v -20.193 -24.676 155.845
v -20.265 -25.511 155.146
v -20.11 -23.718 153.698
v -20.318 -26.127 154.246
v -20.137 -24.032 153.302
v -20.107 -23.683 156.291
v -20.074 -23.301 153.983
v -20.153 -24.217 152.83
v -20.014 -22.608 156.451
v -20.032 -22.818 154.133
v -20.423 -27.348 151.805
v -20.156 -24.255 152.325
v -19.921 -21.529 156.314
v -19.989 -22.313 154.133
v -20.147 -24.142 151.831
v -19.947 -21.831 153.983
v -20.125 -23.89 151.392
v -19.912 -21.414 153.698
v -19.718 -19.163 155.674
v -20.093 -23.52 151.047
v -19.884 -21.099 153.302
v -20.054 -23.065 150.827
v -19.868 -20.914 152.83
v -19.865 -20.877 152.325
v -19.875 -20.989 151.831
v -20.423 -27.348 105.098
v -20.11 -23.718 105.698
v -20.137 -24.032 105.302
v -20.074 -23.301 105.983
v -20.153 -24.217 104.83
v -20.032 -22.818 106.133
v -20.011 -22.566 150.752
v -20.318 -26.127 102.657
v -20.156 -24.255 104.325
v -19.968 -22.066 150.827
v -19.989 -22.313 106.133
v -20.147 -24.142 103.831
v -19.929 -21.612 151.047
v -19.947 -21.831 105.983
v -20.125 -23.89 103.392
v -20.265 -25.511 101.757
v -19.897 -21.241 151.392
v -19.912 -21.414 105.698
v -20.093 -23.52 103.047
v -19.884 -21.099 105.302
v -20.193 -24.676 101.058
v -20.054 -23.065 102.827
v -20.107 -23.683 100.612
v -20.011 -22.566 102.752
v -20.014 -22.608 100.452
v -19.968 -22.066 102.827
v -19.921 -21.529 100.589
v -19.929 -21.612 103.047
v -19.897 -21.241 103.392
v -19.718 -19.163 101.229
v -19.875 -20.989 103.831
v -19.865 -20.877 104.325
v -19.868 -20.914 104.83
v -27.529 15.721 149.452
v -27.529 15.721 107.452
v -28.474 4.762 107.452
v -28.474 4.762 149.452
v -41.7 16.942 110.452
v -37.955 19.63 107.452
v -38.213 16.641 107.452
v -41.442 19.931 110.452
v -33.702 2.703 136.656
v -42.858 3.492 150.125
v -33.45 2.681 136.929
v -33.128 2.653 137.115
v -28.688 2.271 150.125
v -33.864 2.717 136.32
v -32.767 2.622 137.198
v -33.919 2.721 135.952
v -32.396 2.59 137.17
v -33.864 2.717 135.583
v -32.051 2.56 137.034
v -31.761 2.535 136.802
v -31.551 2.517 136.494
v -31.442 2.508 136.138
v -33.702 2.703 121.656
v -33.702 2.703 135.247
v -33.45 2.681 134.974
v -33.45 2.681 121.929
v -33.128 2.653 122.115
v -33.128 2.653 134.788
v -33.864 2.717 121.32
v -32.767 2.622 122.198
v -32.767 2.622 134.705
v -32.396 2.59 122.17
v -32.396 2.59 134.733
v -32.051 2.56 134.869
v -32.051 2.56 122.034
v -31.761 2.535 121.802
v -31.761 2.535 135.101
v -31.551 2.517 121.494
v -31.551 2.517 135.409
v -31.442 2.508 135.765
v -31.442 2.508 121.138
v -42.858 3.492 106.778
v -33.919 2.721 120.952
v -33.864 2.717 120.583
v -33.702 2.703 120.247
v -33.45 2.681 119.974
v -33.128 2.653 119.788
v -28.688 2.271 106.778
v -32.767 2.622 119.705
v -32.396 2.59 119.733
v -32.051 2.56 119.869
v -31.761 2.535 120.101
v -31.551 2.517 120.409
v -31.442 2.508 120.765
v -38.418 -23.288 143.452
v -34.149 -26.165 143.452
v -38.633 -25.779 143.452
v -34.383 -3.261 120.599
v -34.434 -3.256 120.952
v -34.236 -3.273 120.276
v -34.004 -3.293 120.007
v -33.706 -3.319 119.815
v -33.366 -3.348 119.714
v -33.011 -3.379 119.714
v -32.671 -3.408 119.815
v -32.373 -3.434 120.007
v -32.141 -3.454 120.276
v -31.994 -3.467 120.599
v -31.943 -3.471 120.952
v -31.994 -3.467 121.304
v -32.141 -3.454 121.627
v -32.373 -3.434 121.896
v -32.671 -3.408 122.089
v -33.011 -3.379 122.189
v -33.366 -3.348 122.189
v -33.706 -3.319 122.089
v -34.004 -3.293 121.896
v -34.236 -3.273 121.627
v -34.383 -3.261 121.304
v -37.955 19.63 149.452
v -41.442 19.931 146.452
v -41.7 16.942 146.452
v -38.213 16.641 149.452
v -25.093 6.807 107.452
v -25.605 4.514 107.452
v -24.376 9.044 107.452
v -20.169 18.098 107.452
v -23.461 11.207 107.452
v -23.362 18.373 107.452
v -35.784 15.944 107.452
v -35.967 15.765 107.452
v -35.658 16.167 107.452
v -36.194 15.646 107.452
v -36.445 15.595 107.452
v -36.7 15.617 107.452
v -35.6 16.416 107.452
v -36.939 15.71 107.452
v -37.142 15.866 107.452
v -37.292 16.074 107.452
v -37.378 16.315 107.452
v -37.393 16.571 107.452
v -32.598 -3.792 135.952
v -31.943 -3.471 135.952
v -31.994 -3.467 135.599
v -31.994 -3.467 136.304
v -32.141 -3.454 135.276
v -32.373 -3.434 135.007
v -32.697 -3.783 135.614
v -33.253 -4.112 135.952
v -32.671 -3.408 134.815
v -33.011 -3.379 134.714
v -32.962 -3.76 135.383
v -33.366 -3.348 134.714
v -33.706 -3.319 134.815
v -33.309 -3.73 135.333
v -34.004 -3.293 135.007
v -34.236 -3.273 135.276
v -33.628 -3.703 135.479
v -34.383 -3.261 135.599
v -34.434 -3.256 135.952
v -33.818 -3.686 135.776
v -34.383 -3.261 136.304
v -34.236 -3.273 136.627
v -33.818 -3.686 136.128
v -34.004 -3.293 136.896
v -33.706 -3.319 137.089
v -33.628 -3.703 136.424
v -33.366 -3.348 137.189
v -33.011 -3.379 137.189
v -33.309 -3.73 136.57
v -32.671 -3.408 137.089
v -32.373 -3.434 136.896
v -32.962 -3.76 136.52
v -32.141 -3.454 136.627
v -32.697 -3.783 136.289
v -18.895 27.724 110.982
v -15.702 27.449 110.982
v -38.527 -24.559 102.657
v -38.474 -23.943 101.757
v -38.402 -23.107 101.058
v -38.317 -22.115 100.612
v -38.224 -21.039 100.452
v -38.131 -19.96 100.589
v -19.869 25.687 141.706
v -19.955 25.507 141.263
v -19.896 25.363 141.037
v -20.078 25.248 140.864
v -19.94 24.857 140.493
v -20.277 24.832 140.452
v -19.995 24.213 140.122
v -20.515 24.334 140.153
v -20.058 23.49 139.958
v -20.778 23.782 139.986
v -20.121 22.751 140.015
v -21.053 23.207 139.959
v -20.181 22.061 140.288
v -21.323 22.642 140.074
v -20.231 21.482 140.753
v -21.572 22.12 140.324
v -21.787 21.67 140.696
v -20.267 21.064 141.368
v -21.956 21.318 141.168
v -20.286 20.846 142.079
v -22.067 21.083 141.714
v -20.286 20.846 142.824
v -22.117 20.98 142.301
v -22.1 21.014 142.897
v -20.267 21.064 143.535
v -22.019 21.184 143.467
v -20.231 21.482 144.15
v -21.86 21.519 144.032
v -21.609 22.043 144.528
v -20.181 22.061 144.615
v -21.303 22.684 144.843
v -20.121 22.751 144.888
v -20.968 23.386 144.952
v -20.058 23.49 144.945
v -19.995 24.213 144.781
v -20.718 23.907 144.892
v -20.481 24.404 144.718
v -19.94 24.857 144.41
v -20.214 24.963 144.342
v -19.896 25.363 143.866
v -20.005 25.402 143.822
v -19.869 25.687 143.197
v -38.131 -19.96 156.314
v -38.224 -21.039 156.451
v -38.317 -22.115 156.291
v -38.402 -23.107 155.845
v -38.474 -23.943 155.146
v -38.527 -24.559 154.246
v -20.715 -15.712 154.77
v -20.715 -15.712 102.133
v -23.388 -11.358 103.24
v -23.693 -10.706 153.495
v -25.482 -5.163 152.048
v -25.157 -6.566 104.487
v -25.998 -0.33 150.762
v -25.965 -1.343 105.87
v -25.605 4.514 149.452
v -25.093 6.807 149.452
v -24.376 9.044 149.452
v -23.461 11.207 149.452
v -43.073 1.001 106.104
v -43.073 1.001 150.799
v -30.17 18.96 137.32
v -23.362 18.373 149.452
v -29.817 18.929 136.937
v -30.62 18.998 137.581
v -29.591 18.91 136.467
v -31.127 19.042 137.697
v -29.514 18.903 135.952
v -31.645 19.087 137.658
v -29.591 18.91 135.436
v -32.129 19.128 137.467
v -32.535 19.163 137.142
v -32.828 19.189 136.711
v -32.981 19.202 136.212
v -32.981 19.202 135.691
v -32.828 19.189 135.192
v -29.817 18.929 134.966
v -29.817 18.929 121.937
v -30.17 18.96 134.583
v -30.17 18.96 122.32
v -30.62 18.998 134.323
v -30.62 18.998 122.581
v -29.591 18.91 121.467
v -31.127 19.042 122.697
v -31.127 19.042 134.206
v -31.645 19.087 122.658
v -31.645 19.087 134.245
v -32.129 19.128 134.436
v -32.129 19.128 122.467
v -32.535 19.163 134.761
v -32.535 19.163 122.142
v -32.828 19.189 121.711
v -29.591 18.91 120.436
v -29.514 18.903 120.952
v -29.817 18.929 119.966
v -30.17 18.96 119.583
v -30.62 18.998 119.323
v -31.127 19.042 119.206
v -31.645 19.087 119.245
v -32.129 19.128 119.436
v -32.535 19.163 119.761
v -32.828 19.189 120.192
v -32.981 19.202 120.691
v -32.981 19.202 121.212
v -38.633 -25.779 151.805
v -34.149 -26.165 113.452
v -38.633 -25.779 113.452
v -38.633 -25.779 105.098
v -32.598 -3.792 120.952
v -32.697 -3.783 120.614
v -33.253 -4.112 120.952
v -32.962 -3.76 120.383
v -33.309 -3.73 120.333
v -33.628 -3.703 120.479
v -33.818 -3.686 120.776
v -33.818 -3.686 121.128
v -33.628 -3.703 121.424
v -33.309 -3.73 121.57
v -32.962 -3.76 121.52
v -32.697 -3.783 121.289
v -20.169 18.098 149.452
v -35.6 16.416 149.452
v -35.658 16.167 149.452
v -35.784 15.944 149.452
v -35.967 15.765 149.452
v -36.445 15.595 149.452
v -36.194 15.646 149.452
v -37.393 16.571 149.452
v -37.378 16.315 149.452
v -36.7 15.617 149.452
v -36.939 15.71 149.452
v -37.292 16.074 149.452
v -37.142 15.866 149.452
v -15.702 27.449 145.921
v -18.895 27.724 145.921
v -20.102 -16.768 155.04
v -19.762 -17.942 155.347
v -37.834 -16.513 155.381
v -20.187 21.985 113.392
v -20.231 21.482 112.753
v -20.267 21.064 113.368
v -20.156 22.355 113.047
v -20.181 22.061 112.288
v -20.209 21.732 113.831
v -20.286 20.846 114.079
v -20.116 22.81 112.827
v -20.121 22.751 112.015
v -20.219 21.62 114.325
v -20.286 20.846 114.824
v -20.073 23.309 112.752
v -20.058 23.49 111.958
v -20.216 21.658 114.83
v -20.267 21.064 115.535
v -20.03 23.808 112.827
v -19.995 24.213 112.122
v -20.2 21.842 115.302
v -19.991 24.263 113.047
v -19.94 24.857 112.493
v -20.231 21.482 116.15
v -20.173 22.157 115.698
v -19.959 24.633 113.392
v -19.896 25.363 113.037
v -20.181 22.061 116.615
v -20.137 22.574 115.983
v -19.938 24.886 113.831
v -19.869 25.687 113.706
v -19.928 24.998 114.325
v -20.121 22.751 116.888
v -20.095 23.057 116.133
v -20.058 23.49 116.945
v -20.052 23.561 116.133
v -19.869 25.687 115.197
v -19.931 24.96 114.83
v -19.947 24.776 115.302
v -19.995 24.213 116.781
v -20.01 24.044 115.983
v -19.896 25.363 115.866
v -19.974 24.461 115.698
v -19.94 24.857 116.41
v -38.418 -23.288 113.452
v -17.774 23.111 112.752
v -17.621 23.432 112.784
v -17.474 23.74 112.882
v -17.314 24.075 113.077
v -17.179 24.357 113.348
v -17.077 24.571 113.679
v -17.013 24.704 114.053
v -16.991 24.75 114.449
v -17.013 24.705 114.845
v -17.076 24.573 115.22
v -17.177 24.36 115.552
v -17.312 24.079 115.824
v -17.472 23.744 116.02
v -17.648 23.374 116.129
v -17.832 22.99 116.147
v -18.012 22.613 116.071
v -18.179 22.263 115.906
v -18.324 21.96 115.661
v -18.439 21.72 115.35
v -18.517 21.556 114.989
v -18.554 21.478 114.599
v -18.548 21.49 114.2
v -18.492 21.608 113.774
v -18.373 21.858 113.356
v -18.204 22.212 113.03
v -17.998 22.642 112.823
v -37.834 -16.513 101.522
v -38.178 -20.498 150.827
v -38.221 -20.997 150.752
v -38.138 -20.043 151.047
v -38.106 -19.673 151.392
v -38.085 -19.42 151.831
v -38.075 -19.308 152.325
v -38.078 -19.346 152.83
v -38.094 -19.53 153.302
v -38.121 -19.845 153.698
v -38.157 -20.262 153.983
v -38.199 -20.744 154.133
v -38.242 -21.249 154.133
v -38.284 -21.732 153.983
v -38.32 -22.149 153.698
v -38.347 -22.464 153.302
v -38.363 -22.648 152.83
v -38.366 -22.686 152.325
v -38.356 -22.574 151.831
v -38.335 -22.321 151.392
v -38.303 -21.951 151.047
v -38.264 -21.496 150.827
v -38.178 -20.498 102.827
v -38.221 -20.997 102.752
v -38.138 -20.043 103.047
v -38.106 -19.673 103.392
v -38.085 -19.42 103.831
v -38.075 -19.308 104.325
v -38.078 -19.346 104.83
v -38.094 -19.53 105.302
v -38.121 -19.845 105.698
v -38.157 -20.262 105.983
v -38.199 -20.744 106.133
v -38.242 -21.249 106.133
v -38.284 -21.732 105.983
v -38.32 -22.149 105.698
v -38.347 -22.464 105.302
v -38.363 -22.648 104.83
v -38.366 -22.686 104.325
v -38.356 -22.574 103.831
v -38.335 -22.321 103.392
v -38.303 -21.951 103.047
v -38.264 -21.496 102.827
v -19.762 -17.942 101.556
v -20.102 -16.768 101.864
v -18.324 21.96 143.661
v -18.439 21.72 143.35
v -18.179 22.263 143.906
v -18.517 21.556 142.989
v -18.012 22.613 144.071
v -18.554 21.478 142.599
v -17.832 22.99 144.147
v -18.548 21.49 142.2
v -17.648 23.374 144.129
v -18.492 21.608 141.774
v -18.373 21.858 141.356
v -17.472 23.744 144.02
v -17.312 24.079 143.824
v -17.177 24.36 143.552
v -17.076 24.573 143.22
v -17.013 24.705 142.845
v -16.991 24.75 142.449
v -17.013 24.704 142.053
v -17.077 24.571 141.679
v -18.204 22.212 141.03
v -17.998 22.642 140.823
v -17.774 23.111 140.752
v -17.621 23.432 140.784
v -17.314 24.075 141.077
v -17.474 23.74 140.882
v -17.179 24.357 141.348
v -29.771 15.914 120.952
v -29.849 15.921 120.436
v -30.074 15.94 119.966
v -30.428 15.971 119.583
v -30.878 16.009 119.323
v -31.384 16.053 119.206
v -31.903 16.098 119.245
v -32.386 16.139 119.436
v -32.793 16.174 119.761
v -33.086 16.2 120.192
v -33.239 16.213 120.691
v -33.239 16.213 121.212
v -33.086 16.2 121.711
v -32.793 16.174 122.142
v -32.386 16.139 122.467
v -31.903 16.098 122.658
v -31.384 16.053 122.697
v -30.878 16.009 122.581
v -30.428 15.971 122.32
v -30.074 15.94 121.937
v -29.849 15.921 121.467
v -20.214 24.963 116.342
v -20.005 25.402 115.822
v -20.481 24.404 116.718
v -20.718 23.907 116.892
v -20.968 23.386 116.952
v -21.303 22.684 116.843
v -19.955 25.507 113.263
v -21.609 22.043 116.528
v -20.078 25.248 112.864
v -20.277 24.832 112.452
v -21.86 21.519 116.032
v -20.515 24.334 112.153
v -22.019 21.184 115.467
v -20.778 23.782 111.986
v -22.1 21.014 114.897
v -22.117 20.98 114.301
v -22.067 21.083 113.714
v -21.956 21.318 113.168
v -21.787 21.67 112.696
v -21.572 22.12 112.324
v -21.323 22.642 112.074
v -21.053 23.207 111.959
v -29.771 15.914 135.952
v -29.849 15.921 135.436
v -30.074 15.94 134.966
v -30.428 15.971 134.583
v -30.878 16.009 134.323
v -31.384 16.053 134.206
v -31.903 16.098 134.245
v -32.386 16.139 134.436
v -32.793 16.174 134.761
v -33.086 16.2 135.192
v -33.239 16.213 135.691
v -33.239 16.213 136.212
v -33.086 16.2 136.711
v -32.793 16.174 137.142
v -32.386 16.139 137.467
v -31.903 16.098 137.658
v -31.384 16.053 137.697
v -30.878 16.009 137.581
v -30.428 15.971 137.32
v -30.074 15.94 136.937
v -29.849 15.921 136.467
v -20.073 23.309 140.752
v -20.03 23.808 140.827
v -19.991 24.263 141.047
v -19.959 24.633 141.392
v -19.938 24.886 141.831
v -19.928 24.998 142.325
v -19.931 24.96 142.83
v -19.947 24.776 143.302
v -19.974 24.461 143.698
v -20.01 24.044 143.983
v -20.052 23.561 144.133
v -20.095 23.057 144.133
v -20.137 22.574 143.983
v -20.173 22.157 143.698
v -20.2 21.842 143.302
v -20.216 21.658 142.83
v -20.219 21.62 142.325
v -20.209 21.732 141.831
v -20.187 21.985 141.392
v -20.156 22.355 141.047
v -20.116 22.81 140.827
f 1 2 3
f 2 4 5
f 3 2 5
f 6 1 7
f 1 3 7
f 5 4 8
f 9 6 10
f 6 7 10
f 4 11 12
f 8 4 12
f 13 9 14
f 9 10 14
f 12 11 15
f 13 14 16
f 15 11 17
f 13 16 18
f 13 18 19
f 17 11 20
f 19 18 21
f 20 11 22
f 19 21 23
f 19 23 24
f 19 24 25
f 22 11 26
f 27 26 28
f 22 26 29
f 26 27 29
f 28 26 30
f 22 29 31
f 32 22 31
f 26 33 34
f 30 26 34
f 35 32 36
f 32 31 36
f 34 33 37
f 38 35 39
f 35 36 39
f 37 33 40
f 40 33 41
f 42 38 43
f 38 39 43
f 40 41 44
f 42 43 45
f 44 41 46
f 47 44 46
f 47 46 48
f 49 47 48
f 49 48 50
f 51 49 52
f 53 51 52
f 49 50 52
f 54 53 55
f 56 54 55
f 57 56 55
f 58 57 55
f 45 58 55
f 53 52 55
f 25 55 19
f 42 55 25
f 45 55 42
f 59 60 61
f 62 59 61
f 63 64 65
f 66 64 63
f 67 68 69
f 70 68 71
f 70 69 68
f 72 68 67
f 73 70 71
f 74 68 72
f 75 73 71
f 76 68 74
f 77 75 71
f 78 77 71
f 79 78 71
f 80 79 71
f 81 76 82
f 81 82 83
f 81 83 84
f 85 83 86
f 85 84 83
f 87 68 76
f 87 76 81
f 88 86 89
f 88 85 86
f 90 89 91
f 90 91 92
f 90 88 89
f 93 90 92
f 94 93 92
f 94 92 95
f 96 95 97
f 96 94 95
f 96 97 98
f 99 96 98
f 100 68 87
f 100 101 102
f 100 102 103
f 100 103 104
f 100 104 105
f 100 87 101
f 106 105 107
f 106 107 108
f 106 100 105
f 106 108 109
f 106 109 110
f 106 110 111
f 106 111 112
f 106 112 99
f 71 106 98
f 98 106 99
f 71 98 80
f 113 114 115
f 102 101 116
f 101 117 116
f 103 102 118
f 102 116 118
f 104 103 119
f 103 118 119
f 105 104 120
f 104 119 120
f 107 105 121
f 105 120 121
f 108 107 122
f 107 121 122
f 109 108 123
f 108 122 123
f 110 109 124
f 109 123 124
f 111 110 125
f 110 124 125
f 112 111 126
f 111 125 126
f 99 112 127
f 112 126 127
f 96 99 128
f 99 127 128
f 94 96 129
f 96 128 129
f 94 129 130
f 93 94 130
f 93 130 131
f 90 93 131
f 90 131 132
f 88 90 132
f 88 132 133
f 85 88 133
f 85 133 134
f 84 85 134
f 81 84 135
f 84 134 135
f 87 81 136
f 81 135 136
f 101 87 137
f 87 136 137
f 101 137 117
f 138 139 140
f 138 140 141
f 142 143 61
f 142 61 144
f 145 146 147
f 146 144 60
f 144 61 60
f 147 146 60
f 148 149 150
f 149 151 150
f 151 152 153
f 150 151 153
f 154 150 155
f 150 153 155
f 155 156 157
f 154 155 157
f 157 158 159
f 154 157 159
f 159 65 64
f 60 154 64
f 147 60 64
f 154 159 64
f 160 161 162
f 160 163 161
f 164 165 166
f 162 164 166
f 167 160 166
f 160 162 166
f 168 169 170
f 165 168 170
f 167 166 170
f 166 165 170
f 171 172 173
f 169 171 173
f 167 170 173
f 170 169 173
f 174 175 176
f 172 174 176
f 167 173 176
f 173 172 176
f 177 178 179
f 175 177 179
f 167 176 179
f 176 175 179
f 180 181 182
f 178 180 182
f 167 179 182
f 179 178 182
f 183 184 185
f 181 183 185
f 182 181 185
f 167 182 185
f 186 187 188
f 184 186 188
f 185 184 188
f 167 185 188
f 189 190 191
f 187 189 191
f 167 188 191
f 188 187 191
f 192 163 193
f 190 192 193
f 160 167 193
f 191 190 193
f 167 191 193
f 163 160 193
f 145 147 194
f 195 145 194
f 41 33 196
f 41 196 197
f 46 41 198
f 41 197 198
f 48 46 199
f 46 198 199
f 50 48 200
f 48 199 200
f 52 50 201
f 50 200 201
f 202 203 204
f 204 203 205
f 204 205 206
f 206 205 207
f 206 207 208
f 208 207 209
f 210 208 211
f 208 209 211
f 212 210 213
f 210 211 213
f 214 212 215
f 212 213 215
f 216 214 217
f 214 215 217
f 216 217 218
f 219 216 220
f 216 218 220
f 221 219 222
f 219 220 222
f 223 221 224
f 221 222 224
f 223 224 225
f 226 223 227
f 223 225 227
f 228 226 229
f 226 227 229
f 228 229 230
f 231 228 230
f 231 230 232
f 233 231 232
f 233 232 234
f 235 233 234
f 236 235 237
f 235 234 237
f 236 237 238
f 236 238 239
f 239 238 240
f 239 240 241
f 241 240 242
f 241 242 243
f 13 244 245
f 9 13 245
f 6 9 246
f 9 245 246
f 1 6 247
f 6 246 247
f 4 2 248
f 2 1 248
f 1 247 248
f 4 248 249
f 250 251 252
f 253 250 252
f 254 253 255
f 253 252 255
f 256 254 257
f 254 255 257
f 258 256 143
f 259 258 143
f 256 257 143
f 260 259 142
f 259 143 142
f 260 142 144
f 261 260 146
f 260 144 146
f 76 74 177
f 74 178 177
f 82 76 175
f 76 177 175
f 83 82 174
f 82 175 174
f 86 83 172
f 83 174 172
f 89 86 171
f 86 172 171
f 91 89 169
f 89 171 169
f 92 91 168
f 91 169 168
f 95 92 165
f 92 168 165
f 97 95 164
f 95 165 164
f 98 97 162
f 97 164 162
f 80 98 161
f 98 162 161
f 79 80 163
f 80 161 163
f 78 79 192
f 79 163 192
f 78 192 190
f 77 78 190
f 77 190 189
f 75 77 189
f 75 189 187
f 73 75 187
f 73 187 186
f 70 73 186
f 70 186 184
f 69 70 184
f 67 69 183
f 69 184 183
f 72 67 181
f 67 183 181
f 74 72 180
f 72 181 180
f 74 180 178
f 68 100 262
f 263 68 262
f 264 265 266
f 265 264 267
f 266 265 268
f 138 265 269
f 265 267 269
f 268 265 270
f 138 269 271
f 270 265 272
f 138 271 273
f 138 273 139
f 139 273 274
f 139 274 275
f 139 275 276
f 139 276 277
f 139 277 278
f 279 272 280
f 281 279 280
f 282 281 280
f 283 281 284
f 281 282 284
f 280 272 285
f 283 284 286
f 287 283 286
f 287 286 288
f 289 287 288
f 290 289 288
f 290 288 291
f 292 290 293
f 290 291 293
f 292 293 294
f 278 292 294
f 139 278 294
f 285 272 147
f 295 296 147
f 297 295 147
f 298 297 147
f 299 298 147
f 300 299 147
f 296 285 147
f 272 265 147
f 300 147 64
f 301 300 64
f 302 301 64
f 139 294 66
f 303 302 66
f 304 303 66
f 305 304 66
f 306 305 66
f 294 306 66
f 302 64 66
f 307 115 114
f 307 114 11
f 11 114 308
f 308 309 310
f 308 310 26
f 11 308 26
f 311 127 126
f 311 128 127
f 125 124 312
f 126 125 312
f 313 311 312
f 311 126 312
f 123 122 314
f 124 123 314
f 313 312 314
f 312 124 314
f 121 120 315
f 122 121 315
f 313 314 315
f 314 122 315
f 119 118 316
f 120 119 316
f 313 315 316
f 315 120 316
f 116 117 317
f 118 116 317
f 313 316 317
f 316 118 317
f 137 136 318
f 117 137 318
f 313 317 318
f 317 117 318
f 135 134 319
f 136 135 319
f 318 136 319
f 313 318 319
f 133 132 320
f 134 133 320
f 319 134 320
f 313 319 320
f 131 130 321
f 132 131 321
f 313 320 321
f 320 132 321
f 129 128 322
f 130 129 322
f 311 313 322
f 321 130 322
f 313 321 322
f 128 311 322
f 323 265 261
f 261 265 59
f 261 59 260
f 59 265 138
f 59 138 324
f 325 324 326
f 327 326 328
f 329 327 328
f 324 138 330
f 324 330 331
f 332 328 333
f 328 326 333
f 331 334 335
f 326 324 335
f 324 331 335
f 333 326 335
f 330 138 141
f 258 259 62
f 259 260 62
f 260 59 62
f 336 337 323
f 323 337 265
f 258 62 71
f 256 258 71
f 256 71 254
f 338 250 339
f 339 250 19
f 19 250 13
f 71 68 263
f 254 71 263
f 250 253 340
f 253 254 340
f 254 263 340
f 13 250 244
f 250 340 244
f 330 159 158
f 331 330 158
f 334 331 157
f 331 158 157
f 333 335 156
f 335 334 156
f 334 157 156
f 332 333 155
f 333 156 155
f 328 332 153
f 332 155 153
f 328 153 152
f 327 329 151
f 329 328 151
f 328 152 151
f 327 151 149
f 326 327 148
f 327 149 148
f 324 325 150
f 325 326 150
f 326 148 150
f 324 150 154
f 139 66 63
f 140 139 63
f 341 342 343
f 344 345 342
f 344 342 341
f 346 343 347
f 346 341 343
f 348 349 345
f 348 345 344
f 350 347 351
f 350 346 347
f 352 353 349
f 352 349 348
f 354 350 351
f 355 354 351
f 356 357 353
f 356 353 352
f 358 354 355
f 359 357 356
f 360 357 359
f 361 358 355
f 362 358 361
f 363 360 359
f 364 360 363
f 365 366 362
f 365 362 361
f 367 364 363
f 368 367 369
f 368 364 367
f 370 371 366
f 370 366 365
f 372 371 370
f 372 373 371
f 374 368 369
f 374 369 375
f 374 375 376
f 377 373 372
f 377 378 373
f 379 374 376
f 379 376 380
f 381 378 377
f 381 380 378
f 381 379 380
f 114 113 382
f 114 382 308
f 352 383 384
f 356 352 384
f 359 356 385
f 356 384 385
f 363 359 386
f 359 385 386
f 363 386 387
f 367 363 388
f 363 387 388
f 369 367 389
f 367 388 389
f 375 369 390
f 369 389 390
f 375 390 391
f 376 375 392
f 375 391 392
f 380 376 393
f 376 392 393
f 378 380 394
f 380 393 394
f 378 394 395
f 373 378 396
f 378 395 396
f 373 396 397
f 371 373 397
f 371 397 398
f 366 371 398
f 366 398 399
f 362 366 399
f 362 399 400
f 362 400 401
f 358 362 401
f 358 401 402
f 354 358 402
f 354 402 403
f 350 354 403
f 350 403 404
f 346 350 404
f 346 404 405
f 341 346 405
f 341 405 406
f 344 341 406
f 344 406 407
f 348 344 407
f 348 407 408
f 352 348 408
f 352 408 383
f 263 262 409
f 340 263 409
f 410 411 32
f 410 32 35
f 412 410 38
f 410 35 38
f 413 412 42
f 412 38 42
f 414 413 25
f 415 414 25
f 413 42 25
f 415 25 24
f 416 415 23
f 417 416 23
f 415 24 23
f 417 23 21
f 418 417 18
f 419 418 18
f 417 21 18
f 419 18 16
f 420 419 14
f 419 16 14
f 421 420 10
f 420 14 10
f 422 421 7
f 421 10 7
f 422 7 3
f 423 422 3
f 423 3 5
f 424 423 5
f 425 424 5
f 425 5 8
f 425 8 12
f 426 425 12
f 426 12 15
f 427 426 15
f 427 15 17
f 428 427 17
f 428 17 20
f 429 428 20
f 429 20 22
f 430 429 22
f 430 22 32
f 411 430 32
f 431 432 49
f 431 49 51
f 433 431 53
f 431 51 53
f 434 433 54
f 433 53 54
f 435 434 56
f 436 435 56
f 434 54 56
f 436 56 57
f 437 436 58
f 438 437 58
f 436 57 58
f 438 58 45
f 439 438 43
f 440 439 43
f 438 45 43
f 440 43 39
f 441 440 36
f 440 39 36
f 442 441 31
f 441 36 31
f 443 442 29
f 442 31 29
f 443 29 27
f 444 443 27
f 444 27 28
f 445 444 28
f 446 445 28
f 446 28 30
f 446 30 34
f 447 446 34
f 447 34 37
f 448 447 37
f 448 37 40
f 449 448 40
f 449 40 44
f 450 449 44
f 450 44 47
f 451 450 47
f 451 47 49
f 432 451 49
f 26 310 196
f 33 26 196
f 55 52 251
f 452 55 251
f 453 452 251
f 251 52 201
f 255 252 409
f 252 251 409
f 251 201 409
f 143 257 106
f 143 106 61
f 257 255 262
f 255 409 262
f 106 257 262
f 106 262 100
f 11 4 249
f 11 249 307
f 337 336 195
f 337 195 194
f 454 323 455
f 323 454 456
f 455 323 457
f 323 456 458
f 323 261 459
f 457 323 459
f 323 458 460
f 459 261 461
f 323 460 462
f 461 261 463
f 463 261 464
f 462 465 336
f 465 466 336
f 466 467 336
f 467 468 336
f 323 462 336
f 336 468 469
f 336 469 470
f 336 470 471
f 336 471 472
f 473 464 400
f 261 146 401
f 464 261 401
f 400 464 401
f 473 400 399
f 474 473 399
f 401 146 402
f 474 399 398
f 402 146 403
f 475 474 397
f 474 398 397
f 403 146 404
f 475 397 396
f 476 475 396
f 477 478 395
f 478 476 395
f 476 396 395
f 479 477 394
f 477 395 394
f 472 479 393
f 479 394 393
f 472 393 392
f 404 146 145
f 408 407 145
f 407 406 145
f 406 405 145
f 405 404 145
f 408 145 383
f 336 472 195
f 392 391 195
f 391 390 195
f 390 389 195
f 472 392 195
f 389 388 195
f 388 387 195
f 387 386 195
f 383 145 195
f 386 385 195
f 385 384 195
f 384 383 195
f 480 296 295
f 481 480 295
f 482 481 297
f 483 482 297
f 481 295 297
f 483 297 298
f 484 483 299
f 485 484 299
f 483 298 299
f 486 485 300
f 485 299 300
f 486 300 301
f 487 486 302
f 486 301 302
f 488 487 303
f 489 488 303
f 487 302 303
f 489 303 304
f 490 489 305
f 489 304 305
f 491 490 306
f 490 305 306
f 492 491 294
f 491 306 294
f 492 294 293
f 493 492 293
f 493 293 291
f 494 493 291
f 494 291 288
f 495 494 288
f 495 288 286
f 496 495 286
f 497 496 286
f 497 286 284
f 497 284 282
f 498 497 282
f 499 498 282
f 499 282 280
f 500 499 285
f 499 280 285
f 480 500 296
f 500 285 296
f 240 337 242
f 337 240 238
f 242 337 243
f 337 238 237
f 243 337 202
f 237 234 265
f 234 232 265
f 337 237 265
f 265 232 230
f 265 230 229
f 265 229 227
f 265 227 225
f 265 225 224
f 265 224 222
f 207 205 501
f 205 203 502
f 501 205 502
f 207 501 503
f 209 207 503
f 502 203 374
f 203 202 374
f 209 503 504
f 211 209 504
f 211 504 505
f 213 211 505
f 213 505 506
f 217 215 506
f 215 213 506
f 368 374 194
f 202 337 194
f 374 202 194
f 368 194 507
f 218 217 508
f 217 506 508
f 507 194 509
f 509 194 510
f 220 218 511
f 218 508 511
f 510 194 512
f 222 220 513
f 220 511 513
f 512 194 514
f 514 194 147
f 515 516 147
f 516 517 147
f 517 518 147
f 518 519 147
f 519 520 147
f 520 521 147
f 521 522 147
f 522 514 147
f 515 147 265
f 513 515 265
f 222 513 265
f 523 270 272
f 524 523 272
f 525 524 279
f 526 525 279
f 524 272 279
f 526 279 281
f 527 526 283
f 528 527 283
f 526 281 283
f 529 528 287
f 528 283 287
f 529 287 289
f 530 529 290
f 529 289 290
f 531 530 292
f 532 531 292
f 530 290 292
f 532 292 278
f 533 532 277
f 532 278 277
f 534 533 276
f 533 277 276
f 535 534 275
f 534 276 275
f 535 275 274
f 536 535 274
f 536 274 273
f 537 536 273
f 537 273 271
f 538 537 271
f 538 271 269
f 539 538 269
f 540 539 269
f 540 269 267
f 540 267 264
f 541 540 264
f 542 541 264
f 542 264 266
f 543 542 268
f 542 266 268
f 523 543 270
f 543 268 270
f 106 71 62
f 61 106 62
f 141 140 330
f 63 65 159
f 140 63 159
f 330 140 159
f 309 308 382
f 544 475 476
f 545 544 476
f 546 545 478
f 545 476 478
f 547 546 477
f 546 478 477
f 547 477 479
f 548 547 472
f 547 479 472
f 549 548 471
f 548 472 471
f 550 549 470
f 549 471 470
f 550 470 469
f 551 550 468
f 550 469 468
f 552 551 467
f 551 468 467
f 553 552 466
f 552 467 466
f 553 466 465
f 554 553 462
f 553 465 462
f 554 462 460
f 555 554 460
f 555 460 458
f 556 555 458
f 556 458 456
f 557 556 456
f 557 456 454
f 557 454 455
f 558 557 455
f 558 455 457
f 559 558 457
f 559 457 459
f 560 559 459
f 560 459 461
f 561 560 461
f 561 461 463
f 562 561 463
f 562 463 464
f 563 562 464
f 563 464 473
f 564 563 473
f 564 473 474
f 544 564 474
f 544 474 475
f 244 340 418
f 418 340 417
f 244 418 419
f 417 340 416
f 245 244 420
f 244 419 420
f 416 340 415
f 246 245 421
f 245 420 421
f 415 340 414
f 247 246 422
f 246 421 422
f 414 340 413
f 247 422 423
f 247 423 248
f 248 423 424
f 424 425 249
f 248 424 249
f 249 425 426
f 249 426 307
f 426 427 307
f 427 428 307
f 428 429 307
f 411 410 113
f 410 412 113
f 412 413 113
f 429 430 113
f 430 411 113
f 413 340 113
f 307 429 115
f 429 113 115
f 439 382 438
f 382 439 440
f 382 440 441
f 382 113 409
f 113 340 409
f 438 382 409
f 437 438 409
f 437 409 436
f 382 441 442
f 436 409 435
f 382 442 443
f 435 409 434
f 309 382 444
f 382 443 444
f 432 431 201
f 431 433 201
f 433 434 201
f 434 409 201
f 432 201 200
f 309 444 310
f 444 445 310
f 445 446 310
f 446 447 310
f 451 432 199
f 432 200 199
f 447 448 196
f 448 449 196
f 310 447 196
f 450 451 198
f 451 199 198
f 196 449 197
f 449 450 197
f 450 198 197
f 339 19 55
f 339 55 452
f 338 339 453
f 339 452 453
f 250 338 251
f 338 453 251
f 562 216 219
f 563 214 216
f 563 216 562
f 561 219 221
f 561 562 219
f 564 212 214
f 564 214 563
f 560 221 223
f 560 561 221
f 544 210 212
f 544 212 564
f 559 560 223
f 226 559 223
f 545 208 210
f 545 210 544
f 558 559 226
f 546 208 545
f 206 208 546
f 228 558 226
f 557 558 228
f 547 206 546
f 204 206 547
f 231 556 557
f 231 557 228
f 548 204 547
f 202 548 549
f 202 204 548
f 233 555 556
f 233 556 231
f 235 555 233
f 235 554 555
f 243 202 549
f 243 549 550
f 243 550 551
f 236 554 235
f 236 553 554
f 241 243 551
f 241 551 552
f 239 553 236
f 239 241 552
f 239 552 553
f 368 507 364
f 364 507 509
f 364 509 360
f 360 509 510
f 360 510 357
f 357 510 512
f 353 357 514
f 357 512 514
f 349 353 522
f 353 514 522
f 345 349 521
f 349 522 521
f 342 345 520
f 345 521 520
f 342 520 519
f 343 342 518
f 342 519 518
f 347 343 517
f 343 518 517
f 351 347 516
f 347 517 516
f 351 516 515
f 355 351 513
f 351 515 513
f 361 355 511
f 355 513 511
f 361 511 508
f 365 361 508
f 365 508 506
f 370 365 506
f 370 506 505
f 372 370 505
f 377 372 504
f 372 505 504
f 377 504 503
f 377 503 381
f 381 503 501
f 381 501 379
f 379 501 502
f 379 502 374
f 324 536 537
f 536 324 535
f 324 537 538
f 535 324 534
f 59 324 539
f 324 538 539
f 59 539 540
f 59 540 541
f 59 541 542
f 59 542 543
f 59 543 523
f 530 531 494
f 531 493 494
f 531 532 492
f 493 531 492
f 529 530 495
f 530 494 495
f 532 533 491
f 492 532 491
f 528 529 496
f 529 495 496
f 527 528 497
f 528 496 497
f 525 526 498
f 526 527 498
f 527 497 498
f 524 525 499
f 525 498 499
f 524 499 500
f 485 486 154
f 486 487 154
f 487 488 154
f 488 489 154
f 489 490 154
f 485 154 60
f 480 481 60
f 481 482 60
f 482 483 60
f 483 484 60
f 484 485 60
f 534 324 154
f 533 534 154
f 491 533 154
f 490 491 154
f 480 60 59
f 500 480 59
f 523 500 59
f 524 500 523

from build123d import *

# Parameters (mm, degrees)
BOSS_EXTRUDE1_DEPTH            = 30
CUT_EXTRUDE1_DEPTH             = 3
CUT_EXTRUDE2_DEPTH             = 60
CUT_EXTRUDE3_DEPTH             = 15
SKETCH7_R                      = 1.75
CUT_EXTRUDE4_DEPTH             = 3
M3X0_5_TAPPED_HOLE1_D          = 2.5
M3X0_5_TAPPED_HOLE1_DEPTH      = 8.5
M3X0_5_TAPPED_HOLE1_TIP        = 0.751075774
M3_CLEARANCE_HOLE1_D           = 3.4
M3_CLEARANCE_HOLE3_D           = 3.4
SKETCH17_R                     = 2.5
CUT_EXTRUDE5_DEPTH             = 21
CUT_EXTRUDE6_REACH             = 51
CUT_EXTRUDE6_DIRECTION_2_DEPTH = 10


with BuildPart() as part:
    # Sketch2 → Boss-Extrude1 (new body, symmetric)
    with BuildSketch(Plane(origin=(13.451769965, -30.26631601, 128.45159414), x_dir=(-0.996309466, 0.085833844, 0), z_dir=(0, 0, -1))):
        with BuildLine():
            Line((34, 0), (34, 8.215390309))
            ThreePointArc((34, 8.215390309), (34.333717374, 10.011443329), (35.290322581, 11.567746711))
            ThreePointArc((35.290322581, 11.567746711), (41.543974558, 24.151766942), (40.336, 38.152))
            Line((40.336, 38.152), (34, 55))
            Line((34, 55), (37.205128205, 55))
            Line((37.205128205, 55), (40.852991453, 45.3))
            Line((40.852991453, 45.3), (59, 45.3))
            Line((59, 45.3), (59, 42.3))
            Line((59, 42.3), (54.677251476, 42.3))
            ThreePointArc((54.677251476, 42.3), (53.777251476, 41.4), (52.877251476, 42.3))
            Line((52.877251476, 42.3), (44.777251476, 42.3))
            Line((44.777251476, 42.3), (44.777251476, 31.3))
            Line((44.777251476, 31.3), (59, 31.3))
            Line((59, 31.3), (59, 26.3))
            Line((59, 26.3), (52.277251476, 9.3))
            Line((52.277251476, 9.3), (52.277251476, 0))
            Line((52.277251476, 0), (34, 0))
        make_face()
    extrude(amount=BOSS_EXTRUDE1_DEPTH, both=True)

    # Sketch3 → Cut-Extrude1 (cut)
    with BuildSketch(Plane(origin=(1.399091662, 16.239844289, 0), x_dir=(0.996309466, -0.085833844, 0), z_dir=(0.085833844, 0.996309466, 0))):
        Polygon((-43, -98.45159414), (-29, -98.45159414), (-43, -110.45159414), align=None)
        Polygon((-43, -146.45159414), (-29, -158.45159414), (-43, -158.45159414), align=None)
    extrude(amount=-CUT_EXTRUDE1_DEPTH, mode=Mode.SUBTRACT)

    # Sketch4 → Cut-Extrude2 (cut)
    with BuildSketch(Plane(origin=(-42.841307019, 3.690855304, 0), x_dir=(0, 0, 1), z_dir=(-0.996309466, 0.085833844, 0))):
        with BuildLine():
            Line((100.589429026, -23.159000176), (107.45159414, 2.3))
            Line((107.45159414, 2.3), (107.45159414, 16.3))
            Line((107.45159414, 16.3), (110.982105413, 26))
            Line((110.982105413, 26), (98.45159414, 26))
            Line((98.45159414, 26), (98.45159414, -29))
            Line((98.45159414, -29), (105.097922488, -29))
            Line((105.097922488, -29), (102.657228442, -27.774947795))
            ThreePointArc((102.657228442, -27.774947795), (100.801138235, -25.835289481), (100.589429026, -23.159000176))
        make_face()
        with BuildLine():
            Line((158.45159414, -29), (158.45159414, 26))
            Line((158.45159414, 26), (145.921082868, 26))
            Line((145.921082868, 26), (149.45159414, 16.3))
            Line((149.45159414, 16.3), (149.45159414, 2.3))
            Line((149.45159414, 2.3), (156.313759254, -23.159000176))
            ThreePointArc((156.313759254, -23.159000176), (156.102050045, -25.835289481), (154.245959839, -27.774947795))
            Line((154.245959839, -27.774947795), (151.805265792, -29))
            Line((151.805265792, -29), (158.45159414, -29))
        make_face()
    extrude(amount=-CUT_EXTRUDE2_DEPTH, mode=Mode.SUBTRACT)

    # Sketch6 → Cut-Extrude3 (cut, symmetric)
    with BuildSketch(Plane(origin=(13.451769965, -30.26631601, 128.45159414), x_dir=(-0.996309466, 0.085833844, 0), z_dir=(0, 0, -1))):
        Polygon((52.277251476, 0), (52.277251476, 2.5), (47.777251476, 0), align=None)
    extrude(amount=CUT_EXTRUDE3_DEPTH, both=True, mode=Mode.SUBTRACT)

    # Sketch7 → Cut-Extrude4 (cut)
    with BuildSketch(Plane(origin=(1.399091662, 16.239844289, 0), x_dir=(0.996309466, -0.085833844, 0), z_dir=(0.085833844, 0.996309466, 0))):
        with Locations((-32.777251476, -135.95159414)):
            Circle(SKETCH7_R)
        with Locations((-32.777251476, -120.95159414)):
            Circle(SKETCH7_R)
    extrude(amount=-CUT_EXTRUDE4_DEPTH, mode=Mode.SUBTRACT)

    # M3x0.5 Tapped Hole1
    with Locations(Plane(origin=(0.197417842, 2.291511771, 0), x_dir=(0.996309466, -0.085833844, 0), z_dir=(0.085833844, 0.996309466, 0))):
        with Locations((-32.777251476, -135.95159414), (-32.777251476, -120.95159414)):
            Hole(M3X0_5_TAPPED_HOLE1_D / 2, depth=M3X0_5_TAPPED_HOLE1_DEPTH)
            with Locations((0, 0, -(M3X0_5_TAPPED_HOLE1_DEPTH + M3X0_5_TAPPED_HOLE1_TIP / 2))):  # 118° drill point
                Cone(0, M3X0_5_TAPPED_HOLE1_D / 2, M3X0_5_TAPPED_HOLE1_TIP, mode=Mode.SUBTRACT)

    # M3 Clearance Hole1 (through all)
    with Locations(Plane(origin=(-36.143369031, 3.113815954, 0), x_dir=(0, 0, 1), z_dir=(-0.996309466, 0.085833844, 0))):
        with Locations((104.45159414, -24.2), (152.45159414, -24.2)):
            Hole(M3_CLEARANCE_HOLE1_D / 2)

    # M3 Clearance Hole3 (through all)
    with Locations(Plane(origin=(-42.841307019, 3.690855304, 0), x_dir=(0, 0, 1), z_dir=(-0.996309466, 0.085833844, 0))):
        with Locations((114.45159414, 21.5), (142.45159414, 21.5)):
            Hole(M3_CLEARANCE_HOLE3_D / 2)

    # Sketch17 → Cut-Extrude5 (cut)
    with BuildSketch(Plane(origin=(-42.841307019, 3.690855304, 0), x_dir=(0, 0, 1), z_dir=(-0.996309466, 0.085833844, 0))):
        with Locations((114.45159414, 21.5)):
            Circle(SKETCH17_R)
        with Locations((142.45159414, 21.5)):
            Circle(SKETCH17_R)
    extrude(amount=-CUT_EXTRUDE5_DEPTH, mode=Mode.SUBTRACT)

    # Cut-Extrude6: up to this face of the body (flat: up to its plane)
    cut_extrude6_end = Plane(part.part.faces().sort_by_distance((-32.038196273, -7.893745722, 152.932561433))[0])
    # Sketch18 → Cut-Extrude6 (cut, up to the picked face)
    with BuildSketch(Plane(origin=(0, 0, 107.45159414), x_dir=(-1, 0, 0), z_dir=(0, 0, -1)), mode=Mode.PRIVATE) as cut_extrude6_sk1:
        Polygon((28.473630197, 4.761573893), (42.643889178, 5.982367075), (42.858473788, 3.491593411), (28.688214808, 2.270800229), align=None)
    cut_extrude6_tool1 = split(extrude(cut_extrude6_sk1.sketch, amount=-CUT_EXTRUDE6_REACH, mode=Mode.PRIVATE), bisect_by=cut_extrude6_end, keep=Keep.BOTH, mode=Mode.PRIVATE)
    add(cut_extrude6_tool1.solids().sort_by_distance((-35.666052, 4.126584, 107.451594))[0], mode=Mode.SUBTRACT)

    # Sketch18 → Cut-Extrude6 direction 2 (cut)
    with BuildSketch(Plane(origin=(0, 0, 107.45159414), x_dir=(-1, 0, 0), z_dir=(0, 0, -1))):
        Polygon((28.473630197, 4.761573893), (42.643889178, 5.982367075), (42.858473788, 3.491593411), (28.688214808, 2.270800229), align=None)
    extrude(amount=CUT_EXTRUDE6_DIRECTION_2_DEPTH, mode=Mode.SUBTRACT)


solid = part.part
